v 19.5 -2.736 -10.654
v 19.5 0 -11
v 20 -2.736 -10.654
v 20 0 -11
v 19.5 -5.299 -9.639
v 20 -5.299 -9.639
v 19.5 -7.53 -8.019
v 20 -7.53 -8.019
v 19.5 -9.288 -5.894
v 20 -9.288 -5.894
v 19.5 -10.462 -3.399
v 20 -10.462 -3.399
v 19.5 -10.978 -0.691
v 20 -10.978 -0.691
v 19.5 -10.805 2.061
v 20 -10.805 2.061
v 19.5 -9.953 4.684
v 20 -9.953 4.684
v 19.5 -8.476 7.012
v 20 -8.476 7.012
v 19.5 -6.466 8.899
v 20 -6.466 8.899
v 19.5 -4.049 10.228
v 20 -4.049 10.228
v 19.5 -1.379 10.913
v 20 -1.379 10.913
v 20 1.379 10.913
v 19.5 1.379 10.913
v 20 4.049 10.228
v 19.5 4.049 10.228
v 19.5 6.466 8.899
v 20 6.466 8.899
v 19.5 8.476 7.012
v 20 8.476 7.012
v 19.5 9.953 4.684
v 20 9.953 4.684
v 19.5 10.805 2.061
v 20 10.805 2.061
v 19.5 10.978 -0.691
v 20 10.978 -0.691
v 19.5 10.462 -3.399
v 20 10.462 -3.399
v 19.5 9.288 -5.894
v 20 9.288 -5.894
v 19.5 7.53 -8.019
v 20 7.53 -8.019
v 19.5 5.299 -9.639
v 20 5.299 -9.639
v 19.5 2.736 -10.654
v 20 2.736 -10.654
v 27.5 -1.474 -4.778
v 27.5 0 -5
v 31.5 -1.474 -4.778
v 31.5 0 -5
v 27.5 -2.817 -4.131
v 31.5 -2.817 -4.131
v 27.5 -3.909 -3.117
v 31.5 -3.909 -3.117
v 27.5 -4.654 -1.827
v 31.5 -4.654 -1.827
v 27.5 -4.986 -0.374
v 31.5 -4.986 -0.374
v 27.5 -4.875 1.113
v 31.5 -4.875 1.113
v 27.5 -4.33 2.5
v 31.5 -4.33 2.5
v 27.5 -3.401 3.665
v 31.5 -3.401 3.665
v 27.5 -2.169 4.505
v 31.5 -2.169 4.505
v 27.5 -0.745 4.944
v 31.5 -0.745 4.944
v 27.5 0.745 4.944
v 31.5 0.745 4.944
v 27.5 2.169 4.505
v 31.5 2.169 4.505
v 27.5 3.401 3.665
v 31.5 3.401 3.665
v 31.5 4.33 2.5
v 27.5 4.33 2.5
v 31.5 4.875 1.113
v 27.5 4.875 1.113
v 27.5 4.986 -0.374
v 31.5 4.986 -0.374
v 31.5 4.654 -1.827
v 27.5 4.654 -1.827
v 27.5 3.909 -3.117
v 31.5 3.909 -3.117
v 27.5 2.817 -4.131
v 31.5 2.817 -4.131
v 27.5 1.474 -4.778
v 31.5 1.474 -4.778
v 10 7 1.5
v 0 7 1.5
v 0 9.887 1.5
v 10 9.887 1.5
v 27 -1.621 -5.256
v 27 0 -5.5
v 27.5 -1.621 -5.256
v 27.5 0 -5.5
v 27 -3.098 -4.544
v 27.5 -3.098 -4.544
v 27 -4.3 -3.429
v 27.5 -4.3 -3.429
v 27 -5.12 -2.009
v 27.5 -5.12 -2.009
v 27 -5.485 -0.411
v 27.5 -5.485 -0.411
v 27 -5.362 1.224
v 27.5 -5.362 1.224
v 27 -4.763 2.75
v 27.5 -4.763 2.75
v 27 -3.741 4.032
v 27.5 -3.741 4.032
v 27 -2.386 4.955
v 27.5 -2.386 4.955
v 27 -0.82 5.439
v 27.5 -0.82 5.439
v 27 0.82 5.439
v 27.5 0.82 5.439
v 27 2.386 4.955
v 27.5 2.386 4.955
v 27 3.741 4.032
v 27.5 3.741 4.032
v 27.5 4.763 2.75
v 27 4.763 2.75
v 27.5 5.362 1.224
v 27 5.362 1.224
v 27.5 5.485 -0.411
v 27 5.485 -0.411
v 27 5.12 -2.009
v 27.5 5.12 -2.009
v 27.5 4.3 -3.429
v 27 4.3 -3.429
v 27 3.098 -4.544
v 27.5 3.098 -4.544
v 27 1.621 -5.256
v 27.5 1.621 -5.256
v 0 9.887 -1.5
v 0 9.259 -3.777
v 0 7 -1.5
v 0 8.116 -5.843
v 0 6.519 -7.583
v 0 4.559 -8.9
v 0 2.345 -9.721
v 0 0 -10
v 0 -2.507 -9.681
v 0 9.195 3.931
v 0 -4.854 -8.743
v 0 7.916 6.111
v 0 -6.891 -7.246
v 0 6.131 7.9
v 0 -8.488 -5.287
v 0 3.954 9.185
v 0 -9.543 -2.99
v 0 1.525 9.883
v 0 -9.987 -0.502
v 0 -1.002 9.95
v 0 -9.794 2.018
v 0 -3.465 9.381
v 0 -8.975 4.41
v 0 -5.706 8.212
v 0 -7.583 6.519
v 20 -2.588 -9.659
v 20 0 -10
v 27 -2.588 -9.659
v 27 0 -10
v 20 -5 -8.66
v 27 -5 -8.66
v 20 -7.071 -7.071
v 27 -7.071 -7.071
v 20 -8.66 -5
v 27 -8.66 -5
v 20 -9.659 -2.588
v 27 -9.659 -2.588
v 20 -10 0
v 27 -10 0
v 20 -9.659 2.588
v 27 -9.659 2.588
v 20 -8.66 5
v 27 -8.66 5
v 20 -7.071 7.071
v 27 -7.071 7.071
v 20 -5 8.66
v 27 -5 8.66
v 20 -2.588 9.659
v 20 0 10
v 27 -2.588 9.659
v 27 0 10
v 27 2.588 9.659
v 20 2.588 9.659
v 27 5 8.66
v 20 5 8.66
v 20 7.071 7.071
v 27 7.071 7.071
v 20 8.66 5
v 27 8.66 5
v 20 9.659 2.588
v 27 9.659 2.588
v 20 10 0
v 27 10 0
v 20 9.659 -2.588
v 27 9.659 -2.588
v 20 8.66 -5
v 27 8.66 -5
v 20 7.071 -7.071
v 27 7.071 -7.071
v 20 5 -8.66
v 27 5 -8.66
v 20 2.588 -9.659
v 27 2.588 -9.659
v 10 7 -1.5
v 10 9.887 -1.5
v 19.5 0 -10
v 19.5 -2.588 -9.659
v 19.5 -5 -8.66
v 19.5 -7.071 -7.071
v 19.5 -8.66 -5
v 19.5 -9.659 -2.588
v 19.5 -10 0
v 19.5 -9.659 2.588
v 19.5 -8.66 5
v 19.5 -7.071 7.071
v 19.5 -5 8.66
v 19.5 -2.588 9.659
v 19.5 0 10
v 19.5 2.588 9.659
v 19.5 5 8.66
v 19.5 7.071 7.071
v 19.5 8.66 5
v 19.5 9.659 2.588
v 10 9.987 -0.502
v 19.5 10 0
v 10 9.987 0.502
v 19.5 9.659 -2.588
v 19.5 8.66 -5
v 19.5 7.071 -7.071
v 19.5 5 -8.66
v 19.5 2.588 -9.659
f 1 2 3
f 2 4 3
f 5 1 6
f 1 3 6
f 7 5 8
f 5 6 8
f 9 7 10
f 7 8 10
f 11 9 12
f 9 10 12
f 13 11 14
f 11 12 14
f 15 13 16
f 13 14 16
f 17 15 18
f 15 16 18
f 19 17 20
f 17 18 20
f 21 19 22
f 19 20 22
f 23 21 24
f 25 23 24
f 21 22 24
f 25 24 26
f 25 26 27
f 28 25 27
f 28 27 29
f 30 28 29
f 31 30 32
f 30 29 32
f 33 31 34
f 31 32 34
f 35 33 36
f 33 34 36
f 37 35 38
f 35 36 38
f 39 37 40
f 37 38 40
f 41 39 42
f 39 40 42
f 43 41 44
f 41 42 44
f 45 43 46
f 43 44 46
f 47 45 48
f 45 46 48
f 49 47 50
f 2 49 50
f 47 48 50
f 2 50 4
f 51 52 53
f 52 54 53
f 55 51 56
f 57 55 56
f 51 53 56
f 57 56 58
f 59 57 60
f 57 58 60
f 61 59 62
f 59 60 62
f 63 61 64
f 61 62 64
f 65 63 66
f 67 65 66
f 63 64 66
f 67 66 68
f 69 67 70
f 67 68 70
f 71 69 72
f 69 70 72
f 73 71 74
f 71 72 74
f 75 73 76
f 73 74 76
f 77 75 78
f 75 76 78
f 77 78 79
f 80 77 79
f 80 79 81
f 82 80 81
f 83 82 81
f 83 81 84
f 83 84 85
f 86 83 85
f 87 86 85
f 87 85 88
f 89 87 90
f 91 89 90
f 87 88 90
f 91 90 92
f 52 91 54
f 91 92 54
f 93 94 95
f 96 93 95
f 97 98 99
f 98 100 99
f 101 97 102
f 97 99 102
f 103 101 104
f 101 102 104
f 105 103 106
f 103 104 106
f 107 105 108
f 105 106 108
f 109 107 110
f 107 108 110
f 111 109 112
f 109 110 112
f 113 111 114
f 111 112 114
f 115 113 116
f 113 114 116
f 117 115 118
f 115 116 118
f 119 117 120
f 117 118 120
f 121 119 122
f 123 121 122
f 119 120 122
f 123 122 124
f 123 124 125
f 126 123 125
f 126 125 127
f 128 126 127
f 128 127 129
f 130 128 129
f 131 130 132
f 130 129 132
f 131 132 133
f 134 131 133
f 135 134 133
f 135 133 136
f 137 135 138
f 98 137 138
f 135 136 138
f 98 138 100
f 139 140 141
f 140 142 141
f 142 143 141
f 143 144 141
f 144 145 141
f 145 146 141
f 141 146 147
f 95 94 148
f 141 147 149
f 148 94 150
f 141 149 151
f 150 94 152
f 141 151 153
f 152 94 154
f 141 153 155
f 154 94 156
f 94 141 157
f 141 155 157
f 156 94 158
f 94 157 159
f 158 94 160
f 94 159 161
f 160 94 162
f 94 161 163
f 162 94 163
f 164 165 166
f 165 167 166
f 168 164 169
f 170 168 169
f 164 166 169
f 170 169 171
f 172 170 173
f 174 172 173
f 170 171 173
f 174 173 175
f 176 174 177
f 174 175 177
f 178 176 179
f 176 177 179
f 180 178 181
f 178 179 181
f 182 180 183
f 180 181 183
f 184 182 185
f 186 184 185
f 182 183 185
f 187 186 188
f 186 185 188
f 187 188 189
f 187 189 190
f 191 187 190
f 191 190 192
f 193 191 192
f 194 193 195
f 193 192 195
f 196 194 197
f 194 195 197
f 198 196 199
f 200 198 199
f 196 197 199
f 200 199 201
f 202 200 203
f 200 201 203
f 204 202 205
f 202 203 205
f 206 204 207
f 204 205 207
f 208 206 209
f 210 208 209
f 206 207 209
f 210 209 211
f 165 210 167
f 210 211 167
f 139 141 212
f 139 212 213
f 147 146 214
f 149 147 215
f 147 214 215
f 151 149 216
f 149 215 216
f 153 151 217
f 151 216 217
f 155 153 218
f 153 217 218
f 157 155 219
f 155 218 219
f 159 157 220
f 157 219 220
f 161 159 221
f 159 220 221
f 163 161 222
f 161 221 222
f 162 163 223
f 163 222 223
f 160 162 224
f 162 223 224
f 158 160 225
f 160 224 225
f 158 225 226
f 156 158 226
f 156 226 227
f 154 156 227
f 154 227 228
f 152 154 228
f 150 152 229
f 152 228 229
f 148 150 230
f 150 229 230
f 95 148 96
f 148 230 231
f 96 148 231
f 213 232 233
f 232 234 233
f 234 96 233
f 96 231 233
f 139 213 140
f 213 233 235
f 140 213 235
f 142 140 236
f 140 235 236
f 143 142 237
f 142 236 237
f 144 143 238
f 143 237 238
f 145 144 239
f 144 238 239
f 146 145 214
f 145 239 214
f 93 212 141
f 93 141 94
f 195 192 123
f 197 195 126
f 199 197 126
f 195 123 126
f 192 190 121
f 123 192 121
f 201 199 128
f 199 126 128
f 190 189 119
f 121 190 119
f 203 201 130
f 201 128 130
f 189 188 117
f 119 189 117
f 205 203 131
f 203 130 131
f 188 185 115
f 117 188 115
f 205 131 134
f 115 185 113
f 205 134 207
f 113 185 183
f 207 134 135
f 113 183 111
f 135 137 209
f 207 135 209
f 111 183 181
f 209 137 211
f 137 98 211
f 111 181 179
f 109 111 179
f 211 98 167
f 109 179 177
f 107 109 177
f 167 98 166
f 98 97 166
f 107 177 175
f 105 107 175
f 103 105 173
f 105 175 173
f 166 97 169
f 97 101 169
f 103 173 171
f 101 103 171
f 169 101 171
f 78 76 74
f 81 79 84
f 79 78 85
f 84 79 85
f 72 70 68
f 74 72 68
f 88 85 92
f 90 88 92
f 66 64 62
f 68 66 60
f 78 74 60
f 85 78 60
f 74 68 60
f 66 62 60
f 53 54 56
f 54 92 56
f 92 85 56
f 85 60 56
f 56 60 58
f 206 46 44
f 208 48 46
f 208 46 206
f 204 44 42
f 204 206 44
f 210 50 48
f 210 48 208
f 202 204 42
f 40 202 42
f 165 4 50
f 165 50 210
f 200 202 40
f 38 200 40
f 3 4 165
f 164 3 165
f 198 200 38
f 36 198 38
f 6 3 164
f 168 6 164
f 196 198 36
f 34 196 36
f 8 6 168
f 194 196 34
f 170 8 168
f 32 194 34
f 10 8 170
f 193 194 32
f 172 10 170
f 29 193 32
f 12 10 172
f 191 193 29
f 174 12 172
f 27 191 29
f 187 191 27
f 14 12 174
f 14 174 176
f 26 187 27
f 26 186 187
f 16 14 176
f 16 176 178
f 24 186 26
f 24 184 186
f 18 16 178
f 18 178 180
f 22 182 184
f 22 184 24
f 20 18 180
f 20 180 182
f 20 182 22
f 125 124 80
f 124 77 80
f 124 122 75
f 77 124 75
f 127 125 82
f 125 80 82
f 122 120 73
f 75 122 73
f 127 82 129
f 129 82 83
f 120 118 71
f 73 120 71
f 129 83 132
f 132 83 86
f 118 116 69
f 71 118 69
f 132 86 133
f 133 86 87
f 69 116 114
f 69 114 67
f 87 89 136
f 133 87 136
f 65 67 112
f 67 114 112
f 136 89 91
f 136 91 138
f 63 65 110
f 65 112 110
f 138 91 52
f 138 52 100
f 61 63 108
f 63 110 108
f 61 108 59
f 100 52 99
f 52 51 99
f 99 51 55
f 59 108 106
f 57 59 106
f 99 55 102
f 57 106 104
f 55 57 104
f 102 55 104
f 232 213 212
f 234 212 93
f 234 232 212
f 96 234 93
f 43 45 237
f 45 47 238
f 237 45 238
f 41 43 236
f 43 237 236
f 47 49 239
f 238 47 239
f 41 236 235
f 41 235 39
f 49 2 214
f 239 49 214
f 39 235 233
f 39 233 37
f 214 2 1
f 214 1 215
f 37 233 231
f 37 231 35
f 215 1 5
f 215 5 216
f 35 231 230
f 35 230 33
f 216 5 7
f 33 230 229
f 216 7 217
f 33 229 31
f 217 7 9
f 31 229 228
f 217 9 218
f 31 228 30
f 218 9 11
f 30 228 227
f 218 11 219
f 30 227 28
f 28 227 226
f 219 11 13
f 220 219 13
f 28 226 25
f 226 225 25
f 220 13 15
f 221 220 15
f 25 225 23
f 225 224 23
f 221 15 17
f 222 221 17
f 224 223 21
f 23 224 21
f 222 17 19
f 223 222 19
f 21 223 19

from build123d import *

# Parameters (mm, degrees)
SKETCH1_W          = 0.5
SKETCH1_H          = 1
SKETCH2_W          = 3
SKETCH2_H          = 6
CUT_EXTRUDE1_DEPTH = 10


with BuildPart() as part:
    # Sketch1 → Revolve1 (revolve)
    with BuildSketch(Plane.XY, mode=Mode.PRIVATE) as revolve1_sk:
        Polygon((31.5, 0), (0, 0), (0, 10), (27, 10), (27, 5.5), (27.5, 5.5), (27.5, 5), (31.5, 5), align=None)
        with Locations((19.75, 10.5)):
            Rectangle(SKETCH1_W, SKETCH1_H)
    revolve(revolve1_sk.sketch.rotate(Axis((0, 0, 0), (-1, 0, 0)), 90), axis=Axis((0, 0, 0), (-1, 0, 0)))

    # Sketch2 → Cut-Extrude1 (cut)
    with BuildSketch(Plane.ZY):
        with Locations((0, 10)):
            Rectangle(SKETCH2_W, SKETCH2_H)
    extrude(amount=-CUT_EXTRUDE1_DEPTH, mode=Mode.SUBTRACT)


solid = part.part
